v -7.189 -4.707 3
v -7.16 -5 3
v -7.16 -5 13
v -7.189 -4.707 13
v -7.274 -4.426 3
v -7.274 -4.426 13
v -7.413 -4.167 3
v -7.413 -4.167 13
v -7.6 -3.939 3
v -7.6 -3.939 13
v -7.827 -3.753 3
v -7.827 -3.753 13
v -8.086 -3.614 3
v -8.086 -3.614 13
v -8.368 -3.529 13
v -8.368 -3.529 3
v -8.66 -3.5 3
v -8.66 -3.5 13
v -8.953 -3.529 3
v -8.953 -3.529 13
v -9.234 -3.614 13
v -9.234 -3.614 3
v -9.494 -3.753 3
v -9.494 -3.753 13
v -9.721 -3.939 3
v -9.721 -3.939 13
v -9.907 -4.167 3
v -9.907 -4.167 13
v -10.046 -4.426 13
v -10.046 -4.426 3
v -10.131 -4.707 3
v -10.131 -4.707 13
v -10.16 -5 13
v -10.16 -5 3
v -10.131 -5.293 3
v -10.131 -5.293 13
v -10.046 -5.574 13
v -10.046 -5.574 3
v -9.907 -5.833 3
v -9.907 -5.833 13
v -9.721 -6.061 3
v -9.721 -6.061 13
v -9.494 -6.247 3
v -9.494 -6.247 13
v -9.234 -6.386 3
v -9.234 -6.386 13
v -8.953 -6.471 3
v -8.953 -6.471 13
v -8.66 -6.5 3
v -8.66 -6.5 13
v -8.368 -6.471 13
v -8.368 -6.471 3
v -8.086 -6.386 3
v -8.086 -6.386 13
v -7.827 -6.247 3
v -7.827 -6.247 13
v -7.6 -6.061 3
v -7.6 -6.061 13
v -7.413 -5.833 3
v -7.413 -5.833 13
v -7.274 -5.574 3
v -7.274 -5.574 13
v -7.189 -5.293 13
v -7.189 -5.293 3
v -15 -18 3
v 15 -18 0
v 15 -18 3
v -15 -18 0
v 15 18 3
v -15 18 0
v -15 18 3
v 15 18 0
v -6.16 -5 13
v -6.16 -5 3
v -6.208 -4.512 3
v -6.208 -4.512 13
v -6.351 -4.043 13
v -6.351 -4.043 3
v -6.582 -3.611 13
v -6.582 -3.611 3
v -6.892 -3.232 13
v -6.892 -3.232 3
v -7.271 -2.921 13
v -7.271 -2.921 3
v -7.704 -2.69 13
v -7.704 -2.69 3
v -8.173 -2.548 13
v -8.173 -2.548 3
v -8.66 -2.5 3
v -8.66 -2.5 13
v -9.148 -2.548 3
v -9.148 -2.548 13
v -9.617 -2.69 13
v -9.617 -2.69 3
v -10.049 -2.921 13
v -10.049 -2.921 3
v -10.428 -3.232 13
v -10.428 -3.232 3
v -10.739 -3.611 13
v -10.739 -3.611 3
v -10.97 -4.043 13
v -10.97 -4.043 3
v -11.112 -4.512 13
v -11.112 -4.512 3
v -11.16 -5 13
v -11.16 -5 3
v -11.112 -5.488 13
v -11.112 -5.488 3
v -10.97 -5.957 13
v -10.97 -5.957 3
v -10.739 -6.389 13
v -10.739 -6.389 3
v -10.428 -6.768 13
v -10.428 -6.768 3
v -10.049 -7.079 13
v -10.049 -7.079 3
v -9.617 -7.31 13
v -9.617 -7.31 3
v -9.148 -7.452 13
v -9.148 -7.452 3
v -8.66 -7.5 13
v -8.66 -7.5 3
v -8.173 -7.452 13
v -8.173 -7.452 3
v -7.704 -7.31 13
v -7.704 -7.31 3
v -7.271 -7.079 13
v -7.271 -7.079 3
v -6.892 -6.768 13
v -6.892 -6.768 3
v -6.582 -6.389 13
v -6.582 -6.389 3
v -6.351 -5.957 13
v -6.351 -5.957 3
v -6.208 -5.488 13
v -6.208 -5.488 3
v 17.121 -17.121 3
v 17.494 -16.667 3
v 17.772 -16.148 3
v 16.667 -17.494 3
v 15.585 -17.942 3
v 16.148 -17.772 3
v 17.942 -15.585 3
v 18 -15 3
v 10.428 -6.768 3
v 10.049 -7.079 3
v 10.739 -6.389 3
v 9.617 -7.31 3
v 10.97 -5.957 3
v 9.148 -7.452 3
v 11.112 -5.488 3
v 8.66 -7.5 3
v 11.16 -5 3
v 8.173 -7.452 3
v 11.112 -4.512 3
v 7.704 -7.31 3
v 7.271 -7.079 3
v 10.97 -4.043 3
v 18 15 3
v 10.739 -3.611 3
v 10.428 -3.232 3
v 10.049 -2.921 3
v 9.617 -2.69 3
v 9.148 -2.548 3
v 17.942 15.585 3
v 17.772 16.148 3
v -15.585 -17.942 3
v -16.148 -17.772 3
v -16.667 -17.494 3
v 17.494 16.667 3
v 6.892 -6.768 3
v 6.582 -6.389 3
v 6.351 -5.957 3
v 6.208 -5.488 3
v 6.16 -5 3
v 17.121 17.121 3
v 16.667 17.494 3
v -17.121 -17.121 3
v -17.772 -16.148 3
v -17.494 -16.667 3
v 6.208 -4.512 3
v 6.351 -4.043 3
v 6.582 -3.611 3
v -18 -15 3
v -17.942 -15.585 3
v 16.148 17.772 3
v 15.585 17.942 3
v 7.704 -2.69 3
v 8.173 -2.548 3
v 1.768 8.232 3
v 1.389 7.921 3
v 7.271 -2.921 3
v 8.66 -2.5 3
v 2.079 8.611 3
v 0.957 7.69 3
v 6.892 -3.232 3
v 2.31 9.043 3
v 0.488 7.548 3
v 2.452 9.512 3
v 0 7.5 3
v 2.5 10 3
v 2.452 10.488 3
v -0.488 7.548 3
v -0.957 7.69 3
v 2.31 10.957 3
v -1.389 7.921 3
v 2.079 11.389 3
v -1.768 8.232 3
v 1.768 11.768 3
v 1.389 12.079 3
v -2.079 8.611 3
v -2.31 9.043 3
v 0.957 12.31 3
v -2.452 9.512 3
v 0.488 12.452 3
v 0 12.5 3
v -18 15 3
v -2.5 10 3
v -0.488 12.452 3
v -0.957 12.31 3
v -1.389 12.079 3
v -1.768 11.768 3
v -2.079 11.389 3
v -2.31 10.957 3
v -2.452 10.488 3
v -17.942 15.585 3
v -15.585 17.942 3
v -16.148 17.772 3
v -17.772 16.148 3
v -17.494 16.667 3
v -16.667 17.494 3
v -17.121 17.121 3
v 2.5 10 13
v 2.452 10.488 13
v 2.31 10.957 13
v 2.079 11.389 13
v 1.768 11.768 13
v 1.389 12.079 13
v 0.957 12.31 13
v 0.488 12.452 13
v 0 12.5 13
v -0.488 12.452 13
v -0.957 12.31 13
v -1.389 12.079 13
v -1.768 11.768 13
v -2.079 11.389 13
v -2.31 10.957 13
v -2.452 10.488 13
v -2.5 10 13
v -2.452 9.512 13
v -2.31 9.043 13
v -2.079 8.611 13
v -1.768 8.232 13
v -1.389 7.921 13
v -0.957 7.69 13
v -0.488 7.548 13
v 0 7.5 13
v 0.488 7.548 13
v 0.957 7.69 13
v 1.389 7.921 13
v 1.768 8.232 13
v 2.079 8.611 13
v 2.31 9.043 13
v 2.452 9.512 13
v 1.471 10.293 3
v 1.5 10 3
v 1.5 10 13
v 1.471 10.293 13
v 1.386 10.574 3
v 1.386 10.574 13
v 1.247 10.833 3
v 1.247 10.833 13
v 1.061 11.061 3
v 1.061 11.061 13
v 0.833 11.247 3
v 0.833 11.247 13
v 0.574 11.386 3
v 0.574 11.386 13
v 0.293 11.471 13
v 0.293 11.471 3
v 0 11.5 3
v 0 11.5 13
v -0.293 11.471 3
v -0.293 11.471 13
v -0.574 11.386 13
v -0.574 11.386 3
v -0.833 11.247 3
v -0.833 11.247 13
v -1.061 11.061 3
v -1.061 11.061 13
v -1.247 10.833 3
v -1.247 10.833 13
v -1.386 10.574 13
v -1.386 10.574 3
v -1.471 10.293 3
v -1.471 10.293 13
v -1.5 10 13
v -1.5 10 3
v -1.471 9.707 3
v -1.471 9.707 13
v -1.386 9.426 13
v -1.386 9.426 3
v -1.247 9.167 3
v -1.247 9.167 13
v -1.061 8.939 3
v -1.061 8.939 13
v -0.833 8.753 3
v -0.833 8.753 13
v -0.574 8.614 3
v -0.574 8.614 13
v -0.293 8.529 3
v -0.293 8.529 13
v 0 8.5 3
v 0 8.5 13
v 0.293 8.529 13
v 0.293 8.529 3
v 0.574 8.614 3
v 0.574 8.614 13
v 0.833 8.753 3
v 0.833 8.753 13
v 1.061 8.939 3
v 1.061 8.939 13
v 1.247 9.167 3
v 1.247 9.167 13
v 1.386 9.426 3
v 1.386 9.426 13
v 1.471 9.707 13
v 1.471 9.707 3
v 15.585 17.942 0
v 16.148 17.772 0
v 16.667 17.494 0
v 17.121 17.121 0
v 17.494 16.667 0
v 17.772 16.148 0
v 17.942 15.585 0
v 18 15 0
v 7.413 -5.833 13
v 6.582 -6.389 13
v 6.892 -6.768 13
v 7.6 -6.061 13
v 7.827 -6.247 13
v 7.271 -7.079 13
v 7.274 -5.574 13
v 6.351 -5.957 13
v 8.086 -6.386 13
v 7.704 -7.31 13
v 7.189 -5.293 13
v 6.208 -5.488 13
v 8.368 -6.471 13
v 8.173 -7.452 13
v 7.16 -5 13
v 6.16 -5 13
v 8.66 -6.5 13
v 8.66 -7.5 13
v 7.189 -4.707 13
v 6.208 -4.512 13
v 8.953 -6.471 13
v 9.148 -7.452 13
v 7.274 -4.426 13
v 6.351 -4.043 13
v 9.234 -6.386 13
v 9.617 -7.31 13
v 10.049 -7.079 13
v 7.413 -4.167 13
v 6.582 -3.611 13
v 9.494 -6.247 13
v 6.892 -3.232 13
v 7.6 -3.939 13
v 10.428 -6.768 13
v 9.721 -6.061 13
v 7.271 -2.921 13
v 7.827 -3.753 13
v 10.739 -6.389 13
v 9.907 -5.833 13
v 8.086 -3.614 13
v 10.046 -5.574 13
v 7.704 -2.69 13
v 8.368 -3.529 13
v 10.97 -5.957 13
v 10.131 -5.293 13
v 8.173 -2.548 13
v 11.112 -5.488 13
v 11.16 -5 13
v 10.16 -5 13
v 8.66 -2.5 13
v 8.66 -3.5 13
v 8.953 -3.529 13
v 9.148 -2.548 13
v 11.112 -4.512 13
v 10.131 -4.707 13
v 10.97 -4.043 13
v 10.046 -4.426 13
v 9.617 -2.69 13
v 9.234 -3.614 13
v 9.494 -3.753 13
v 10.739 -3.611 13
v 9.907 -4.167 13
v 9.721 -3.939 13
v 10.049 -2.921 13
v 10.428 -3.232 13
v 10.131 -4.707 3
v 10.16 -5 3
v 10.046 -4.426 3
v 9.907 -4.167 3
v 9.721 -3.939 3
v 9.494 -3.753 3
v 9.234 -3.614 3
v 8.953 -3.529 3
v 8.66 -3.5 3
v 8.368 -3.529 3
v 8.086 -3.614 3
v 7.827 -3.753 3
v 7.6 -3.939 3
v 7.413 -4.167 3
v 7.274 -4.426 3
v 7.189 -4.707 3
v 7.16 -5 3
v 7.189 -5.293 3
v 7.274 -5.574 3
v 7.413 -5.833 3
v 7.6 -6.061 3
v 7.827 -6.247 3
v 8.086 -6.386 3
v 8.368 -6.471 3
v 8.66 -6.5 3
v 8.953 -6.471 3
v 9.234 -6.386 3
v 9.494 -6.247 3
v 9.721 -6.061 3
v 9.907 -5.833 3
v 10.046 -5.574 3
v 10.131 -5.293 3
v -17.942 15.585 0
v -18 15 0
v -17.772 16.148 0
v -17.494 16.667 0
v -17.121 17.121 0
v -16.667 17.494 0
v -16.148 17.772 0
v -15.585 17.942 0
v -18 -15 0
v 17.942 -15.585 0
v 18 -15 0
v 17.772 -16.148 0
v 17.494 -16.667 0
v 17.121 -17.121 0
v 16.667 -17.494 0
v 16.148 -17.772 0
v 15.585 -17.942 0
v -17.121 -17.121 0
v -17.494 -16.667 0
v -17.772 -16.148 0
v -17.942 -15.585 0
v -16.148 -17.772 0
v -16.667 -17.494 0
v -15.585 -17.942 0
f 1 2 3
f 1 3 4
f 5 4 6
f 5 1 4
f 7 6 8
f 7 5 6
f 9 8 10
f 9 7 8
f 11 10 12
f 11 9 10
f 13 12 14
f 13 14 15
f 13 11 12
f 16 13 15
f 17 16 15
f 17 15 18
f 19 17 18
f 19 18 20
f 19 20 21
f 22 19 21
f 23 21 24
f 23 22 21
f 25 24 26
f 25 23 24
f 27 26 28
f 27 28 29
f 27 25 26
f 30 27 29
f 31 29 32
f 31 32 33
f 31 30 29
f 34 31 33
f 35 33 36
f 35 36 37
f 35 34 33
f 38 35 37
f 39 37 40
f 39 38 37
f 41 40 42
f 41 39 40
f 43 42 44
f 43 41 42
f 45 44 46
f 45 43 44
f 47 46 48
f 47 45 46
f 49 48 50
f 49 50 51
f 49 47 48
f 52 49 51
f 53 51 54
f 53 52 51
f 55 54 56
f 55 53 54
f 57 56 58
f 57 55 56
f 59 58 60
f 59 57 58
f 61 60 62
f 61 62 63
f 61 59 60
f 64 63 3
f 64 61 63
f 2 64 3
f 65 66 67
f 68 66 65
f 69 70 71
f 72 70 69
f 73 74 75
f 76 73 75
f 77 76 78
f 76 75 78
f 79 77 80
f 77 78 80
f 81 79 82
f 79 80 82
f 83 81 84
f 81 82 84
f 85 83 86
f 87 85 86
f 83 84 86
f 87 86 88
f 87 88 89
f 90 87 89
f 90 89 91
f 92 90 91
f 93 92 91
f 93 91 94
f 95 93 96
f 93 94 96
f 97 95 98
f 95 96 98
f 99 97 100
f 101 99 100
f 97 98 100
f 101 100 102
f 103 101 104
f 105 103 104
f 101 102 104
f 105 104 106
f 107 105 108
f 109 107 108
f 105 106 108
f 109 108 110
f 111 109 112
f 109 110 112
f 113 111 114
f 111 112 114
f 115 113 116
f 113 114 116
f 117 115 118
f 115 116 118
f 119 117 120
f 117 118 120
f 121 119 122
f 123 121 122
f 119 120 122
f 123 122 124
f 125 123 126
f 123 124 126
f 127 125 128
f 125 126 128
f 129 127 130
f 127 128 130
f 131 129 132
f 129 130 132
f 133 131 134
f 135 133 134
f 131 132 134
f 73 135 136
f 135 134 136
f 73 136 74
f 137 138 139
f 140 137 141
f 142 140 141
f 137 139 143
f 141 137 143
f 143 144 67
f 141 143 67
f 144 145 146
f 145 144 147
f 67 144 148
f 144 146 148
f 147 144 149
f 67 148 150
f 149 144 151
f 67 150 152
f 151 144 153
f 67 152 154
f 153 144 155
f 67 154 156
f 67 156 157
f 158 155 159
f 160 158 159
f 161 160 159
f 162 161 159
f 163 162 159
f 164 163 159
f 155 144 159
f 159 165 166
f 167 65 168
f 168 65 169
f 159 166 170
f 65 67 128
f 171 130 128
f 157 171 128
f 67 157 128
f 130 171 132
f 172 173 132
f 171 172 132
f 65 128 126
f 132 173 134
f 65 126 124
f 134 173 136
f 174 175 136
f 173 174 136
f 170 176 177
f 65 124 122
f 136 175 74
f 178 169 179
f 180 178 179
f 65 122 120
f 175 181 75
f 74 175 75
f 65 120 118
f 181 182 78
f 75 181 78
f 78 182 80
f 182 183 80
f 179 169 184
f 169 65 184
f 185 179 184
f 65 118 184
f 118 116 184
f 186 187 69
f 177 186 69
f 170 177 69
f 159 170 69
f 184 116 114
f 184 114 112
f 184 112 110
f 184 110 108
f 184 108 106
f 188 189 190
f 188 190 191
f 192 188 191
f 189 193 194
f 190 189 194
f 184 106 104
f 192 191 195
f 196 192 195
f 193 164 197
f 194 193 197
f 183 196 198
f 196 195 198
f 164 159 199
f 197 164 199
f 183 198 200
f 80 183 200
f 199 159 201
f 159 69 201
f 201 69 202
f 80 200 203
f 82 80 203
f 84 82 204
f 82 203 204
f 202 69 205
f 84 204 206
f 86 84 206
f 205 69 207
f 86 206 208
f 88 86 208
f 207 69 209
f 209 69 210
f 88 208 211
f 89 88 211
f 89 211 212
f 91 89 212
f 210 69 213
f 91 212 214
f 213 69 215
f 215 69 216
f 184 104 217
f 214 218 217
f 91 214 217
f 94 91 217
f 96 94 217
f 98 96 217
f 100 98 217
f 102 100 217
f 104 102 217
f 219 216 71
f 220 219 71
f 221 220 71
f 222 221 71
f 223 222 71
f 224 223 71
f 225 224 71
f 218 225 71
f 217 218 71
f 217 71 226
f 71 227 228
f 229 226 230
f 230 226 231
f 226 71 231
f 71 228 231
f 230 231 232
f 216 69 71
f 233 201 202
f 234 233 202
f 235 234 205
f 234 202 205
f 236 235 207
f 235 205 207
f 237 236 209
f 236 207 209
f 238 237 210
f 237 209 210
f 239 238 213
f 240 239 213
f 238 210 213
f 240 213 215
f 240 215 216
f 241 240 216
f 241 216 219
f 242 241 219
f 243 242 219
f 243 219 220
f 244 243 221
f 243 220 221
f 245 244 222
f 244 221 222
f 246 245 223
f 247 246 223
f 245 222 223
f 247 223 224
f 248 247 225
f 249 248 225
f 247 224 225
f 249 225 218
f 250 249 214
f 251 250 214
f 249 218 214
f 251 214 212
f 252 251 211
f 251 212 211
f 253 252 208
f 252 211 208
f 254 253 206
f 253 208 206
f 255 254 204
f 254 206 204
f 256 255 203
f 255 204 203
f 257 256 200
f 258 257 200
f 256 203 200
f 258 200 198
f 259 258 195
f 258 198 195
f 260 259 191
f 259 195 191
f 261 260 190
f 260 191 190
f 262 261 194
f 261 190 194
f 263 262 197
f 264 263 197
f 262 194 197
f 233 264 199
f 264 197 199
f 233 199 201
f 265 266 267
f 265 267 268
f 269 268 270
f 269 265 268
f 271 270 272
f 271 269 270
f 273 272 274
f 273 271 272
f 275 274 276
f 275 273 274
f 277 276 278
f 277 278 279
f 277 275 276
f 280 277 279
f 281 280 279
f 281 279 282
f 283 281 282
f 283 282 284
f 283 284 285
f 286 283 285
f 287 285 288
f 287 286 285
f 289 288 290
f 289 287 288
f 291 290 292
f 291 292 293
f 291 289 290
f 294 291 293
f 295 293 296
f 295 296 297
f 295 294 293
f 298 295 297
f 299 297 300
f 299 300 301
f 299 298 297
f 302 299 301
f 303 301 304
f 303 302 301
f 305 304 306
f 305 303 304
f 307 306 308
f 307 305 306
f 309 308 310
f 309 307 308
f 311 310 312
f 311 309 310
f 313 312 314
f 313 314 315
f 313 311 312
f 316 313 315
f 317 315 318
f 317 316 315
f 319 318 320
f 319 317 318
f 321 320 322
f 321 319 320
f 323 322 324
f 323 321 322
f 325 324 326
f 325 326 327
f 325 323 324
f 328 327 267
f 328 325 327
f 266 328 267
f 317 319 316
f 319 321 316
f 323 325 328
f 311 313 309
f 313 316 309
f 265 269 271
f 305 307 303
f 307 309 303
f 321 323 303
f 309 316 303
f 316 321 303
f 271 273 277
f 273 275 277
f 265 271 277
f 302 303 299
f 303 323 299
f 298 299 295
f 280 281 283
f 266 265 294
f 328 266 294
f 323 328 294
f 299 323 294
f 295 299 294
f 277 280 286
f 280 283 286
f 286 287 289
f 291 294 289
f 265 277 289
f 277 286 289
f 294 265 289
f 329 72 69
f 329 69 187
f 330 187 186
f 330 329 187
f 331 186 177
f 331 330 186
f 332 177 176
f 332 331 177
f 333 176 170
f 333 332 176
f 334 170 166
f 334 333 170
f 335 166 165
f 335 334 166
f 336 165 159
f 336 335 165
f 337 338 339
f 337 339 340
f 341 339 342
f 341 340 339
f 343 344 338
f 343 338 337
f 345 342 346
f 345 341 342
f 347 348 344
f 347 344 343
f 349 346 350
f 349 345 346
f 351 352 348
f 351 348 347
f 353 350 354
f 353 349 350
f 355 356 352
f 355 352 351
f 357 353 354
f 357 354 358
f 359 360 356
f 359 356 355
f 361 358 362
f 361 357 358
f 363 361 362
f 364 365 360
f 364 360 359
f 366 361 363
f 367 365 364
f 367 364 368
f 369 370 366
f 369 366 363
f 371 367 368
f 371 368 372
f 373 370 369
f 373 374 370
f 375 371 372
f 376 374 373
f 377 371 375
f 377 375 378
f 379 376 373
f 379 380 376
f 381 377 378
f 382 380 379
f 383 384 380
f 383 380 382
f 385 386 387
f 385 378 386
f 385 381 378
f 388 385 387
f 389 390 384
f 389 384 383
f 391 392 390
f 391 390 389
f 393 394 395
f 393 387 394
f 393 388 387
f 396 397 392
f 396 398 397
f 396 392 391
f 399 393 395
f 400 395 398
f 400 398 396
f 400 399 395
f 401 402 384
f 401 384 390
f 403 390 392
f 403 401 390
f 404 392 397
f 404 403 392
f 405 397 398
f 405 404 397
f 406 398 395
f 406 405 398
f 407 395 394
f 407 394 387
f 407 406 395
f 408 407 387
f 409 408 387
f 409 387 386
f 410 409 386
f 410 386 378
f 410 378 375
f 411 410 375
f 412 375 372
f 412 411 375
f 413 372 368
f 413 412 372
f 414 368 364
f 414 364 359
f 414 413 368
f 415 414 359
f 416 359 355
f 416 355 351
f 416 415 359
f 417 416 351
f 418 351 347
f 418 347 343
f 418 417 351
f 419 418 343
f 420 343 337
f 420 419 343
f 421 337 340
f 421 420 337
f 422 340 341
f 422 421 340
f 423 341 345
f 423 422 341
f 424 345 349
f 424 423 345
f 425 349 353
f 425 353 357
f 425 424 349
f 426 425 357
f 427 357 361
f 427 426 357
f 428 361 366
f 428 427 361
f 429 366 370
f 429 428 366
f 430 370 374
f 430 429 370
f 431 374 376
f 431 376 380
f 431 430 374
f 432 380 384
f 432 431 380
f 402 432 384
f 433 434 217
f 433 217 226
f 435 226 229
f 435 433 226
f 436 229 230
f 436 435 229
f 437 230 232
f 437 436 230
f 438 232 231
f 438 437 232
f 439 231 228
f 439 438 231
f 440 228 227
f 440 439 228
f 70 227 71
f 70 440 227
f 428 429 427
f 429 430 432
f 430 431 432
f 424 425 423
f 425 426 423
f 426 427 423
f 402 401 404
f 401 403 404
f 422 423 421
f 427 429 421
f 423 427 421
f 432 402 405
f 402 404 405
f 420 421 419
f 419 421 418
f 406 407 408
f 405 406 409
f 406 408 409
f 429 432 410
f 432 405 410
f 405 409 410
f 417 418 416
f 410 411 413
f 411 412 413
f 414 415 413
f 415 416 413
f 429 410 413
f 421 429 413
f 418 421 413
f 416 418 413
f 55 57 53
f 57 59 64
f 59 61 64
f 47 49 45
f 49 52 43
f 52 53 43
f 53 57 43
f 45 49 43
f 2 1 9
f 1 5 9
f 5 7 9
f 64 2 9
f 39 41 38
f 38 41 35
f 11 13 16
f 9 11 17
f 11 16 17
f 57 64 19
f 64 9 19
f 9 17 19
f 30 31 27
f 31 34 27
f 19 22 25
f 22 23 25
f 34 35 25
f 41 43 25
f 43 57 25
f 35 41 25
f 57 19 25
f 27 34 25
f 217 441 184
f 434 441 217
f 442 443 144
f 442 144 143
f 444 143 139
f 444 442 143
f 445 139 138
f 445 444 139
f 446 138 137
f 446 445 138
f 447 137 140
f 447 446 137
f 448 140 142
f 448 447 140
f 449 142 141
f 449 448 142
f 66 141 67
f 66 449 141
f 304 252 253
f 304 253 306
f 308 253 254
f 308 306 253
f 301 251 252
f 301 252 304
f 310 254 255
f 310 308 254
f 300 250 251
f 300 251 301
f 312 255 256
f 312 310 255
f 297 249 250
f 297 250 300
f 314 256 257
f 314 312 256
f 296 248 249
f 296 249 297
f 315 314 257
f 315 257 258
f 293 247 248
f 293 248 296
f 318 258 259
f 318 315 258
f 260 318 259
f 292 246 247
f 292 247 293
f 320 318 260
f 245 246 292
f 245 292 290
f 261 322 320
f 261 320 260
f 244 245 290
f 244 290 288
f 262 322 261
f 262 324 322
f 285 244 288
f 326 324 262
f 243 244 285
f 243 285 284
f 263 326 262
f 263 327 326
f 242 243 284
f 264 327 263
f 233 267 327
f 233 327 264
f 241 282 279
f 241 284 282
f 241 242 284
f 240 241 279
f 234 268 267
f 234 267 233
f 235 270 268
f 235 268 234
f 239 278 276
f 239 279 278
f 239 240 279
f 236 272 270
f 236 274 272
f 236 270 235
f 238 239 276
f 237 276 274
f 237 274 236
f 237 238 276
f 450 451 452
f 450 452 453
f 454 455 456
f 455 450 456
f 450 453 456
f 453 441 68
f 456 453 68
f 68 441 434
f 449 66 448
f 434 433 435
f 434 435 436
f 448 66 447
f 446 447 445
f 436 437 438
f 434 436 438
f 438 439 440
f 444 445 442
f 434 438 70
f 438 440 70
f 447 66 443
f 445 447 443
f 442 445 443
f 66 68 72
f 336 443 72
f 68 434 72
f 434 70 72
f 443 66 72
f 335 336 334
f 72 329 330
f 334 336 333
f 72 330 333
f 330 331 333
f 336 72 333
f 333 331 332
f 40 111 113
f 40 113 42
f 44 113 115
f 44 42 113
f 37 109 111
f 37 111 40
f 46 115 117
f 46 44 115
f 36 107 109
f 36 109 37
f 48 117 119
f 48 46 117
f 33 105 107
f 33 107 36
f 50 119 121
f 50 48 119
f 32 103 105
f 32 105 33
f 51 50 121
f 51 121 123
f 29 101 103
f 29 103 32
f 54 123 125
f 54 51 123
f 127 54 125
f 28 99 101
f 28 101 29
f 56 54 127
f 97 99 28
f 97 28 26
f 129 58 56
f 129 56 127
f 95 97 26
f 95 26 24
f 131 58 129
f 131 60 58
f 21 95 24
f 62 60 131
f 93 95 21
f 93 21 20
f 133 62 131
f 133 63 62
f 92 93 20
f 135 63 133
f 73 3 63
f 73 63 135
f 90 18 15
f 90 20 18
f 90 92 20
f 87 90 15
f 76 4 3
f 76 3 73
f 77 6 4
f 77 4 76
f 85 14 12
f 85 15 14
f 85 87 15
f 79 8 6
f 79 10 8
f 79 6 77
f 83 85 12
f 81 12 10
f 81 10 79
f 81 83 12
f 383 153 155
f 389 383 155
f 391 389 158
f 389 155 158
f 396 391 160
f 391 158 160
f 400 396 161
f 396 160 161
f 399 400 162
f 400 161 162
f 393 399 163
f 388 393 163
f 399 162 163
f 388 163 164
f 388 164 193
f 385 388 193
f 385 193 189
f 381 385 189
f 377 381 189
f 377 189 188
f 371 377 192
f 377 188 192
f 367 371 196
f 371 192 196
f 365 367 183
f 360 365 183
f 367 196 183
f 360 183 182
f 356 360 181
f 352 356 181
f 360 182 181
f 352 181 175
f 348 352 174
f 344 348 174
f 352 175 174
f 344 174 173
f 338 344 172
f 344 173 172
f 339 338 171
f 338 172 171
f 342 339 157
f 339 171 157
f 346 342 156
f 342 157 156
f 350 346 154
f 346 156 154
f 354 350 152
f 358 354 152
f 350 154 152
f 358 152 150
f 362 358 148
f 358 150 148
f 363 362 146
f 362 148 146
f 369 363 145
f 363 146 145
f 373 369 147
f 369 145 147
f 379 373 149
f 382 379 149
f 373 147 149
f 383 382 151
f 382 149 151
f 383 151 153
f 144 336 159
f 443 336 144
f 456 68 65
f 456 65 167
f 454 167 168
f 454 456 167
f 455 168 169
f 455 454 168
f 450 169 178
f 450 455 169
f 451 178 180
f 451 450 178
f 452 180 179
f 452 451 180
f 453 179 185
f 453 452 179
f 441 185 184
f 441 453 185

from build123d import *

# Parameters (mm, degrees)
SKETCH1_R           = 2.5
SKETCH1_R_2         = 1.5
BOSS_EXTRUDE1_DEPTH = 3
BOSS_EXTRUDE2_START = 3
SKETCH1_3_R         = 2.5
SKETCH1_3_R_2       = 1.5
BOSS_EXTRUDE2_DEPTH = 10


with BuildPart() as part:
    # Sketch1 → Boss-Extrude1 (new body)
    # profile 1 of 7: a face of its own
    with BuildSketch(Plane.XY):
        with BuildLine():
            ThreePointArc((-18, 15), (-17.121320344, 17.121320344), (-15, 18))
            Line((-15, 18), (15, 18))
            ThreePointArc((15, 18), (17.121320344, 17.121320344), (18, 15))
            Line((18, 15), (18, -15))
            ThreePointArc((18, -15), (17.121320344, -17.121320344), (15, -18))
            Line((15, -18), (-15, -18))
            ThreePointArc((-15, -18), (-17.121320344, -17.121320344), (-18, -15))
            Line((-18, -15), (-18, 15))
        make_face()
        with Locations((-8.660254038, -5)):
            Circle(SKETCH1_R, mode=Mode.SUBTRACT)
        with Locations((8.660254038, -5)):
            Circle(SKETCH1_R, mode=Mode.SUBTRACT)
        with Locations((0, 10)):
            Circle(SKETCH1_R, mode=Mode.SUBTRACT)
    # profile 2 of 7: a face of its own
    with BuildSketch(Plane.XY):
        with Locations((-8.660254038, -5)):
            Circle(SKETCH1_R)
        with Locations((-8.660254038, -5)):
            Circle(SKETCH1_R_2, mode=Mode.SUBTRACT)
    # profile 3 of 7: a face of its own
    with BuildSketch(Plane.XY):
        with Locations((-8.660254038, -5)):
            Circle(SKETCH1_R_2)
    # profile 4 of 7: a face of its own
    with BuildSketch(Plane.XY):
        with Locations((0, 10)):
            Circle(SKETCH1_R)
        with Locations((0, 10)):
            Circle(SKETCH1_R_2, mode=Mode.SUBTRACT)
    # profile 5 of 7: a face of its own
    with BuildSketch(Plane.XY):
        with Locations((0, 10)):
            Circle(SKETCH1_R_2)
    # profile 6 of 7: a face of its own
    with BuildSketch(Plane.XY):
        with Locations((8.660254038, -5)):
            Circle(SKETCH1_R)
        with Locations((8.660254038, -5)):
            Circle(SKETCH1_R_2, mode=Mode.SUBTRACT)
    # profile 7 of 7: a face of its own
    with BuildSketch(Plane.XY):
        with Locations((8.660254038, -5)):
            Circle(SKETCH1_R_2)
    extrude(amount=BOSS_EXTRUDE1_DEPTH)

    # Sketch1<3> → Boss-Extrude2 (add)
    # profile 1 of 3: a face of its own
    with BuildSketch(Plane.XY.offset(BOSS_EXTRUDE2_START)):
        with Locations((-8.660254038, -5)):
            Circle(SKETCH1_3_R)
        with Locations((-8.660254038, -5)):
            Circle(SKETCH1_3_R_2, mode=Mode.SUBTRACT)
    # profile 2 of 3: a face of its own
    with BuildSketch(Plane.XY.offset(BOSS_EXTRUDE2_START)):
        with Locations((0, 10)):
            Circle(SKETCH1_3_R)
        with Locations((0, 10)):
            Circle(SKETCH1_3_R_2, mode=Mode.SUBTRACT)
    # profile 3 of 3: a face of its own
    with BuildSketch(Plane.XY.offset(BOSS_EXTRUDE2_START)):
        with Locations((8.660254038, -5)):
            Circle(SKETCH1_3_R)
        with Locations((8.660254038, -5)):
            Circle(SKETCH1_3_R_2, mode=Mode.SUBTRACT)
    extrude(amount=BOSS_EXTRUDE2_DEPTH)


solid = part.part
